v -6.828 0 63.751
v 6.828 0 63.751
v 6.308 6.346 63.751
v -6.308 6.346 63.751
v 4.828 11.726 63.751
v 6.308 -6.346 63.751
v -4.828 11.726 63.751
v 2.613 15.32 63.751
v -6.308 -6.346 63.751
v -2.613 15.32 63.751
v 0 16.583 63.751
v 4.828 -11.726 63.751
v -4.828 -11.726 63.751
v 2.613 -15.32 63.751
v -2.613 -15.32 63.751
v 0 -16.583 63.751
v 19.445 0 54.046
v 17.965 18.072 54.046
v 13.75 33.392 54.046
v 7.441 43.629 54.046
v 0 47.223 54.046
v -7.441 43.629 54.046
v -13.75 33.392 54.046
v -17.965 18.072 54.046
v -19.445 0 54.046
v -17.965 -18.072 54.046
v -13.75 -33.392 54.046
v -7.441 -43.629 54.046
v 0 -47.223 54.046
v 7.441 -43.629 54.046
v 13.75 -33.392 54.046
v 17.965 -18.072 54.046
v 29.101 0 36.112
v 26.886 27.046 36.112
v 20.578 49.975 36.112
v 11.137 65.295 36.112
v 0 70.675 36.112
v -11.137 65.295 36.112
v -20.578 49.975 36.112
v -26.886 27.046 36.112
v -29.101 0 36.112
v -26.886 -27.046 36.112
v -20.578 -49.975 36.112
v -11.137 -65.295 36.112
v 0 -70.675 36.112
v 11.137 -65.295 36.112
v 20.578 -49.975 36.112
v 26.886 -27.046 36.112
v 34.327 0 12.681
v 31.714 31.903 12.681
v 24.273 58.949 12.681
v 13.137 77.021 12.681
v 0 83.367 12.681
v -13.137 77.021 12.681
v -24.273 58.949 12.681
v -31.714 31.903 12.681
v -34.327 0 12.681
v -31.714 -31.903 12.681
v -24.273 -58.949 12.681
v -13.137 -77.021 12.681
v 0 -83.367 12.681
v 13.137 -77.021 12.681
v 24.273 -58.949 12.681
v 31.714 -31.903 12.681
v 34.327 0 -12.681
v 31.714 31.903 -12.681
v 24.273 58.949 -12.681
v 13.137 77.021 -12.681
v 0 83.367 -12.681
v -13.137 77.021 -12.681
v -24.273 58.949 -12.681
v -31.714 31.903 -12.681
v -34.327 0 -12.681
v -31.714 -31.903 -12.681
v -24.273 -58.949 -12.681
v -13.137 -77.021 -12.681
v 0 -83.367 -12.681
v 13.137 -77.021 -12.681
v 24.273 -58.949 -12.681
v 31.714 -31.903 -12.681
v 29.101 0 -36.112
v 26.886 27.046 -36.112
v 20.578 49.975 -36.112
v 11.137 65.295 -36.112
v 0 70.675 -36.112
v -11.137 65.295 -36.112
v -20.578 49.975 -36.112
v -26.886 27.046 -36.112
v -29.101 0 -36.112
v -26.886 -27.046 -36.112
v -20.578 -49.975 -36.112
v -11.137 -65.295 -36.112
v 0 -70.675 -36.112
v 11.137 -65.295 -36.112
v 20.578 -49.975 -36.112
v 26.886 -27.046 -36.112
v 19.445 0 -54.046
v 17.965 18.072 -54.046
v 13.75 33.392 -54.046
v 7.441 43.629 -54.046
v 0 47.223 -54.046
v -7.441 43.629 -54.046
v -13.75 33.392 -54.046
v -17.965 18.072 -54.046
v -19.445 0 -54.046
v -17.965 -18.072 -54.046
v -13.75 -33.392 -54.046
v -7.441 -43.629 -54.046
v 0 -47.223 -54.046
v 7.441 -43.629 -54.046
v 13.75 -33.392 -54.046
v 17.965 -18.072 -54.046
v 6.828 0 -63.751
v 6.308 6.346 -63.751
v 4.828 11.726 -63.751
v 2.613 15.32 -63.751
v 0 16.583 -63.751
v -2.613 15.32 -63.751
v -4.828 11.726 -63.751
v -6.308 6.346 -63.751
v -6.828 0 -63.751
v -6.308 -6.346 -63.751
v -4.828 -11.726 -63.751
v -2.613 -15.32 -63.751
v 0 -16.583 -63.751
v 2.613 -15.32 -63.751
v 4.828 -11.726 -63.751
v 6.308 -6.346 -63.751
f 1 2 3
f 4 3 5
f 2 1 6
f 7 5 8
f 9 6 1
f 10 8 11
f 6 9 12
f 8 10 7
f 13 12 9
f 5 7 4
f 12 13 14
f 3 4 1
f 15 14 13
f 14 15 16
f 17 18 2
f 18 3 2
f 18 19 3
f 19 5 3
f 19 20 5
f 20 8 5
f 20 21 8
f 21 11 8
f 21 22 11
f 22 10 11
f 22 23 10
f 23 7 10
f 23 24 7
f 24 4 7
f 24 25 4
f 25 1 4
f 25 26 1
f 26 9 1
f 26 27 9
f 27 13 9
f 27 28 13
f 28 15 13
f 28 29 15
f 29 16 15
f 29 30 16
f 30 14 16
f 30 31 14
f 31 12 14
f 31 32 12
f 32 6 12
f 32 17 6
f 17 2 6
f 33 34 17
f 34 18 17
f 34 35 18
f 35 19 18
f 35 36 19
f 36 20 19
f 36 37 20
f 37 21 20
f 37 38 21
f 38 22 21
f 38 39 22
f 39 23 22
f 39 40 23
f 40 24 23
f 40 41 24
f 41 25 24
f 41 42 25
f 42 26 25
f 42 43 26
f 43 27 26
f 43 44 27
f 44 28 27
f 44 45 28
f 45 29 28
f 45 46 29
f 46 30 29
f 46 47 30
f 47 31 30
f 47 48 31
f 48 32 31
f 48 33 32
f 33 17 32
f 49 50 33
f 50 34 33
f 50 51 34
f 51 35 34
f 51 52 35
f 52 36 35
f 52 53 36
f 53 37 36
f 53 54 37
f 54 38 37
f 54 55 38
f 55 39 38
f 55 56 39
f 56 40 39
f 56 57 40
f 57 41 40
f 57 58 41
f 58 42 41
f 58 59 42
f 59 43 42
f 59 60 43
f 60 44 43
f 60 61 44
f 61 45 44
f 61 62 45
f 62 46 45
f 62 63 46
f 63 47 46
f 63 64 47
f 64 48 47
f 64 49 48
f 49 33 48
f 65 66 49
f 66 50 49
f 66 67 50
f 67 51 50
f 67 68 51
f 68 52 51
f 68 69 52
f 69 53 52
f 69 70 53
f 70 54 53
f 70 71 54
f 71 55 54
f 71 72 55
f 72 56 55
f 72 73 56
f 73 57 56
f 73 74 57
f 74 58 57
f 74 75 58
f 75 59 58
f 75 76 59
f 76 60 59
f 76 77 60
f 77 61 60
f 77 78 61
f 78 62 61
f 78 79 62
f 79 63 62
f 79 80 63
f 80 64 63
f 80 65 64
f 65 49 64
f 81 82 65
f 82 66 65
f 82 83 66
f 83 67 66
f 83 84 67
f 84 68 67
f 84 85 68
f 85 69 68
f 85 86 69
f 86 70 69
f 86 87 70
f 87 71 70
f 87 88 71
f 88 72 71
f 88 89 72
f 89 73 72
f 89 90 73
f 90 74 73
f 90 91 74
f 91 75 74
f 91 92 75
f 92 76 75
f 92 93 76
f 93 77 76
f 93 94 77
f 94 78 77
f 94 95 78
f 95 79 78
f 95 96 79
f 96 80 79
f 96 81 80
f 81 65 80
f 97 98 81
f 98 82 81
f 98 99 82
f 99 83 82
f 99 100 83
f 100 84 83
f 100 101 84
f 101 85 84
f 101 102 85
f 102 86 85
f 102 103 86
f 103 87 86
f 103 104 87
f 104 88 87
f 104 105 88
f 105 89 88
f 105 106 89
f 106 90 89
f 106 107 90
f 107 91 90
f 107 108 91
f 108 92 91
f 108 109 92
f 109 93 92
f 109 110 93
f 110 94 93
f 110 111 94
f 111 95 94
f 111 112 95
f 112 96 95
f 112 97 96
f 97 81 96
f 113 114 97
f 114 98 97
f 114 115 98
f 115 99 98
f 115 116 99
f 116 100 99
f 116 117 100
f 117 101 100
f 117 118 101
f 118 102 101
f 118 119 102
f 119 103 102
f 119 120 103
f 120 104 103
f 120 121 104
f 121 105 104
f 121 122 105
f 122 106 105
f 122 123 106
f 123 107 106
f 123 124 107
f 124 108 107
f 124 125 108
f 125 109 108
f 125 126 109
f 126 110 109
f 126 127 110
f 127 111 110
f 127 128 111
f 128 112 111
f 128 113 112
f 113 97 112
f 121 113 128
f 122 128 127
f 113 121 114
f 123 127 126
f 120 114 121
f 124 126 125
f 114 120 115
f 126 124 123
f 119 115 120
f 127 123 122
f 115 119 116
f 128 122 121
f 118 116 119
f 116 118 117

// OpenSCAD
// Generated by SolidPython 1.0.1 on 2020-07-29 00:46:48


scale(v = [7, 17, 13]) {
	sphere(r = 5);
}
/***********************************************
*********      SolidPython code:      **********
************************************************
 
# import packages: SolidPython
from solid import *
from solid.utils import *
from itertools import chain, combinations, permutations


class Resize:

    def __init__(self, scad_file):
        self.scad_file = scad_file
        #self.scad_file = import_scad(scad_file)
        # cone/cylinder param:
        self.r1 = 0
        self.r2 = 0
        self.h = 0
        # rectangular prism param:
        self.w = 0
        self.l = 0
        # ellipse param:
        self.r = 0

    # import OpenScad code (file name corresponds to shape)


    # classify shape + parameters
    def assign(self, param1, param2, param3):
        if self.scad_file == 'cone.scad':
            self.r1 = param1
            self.r2 = param2
            self.h = param3
        elif self.scad_file == 'cylinder.scad':
            self.r1 = param1
            self.r2 = param2
            self.h = param3
        elif self.scad_file == 'rectangularPrism.scad':
            self.h = param1
            self.l = param2
            self.w = param3
        else:
            self.r = param1
            self.h = param2

    # resize parameters
    def iterate(self):
        x = range(3, 20, 2)
        i = 1
        if self.scad_file == 'cone.scad':
            tempList = list(permutations(x, 2))
            for temp in tempList:
                param1 = temp[0]
                param2 = temp[1]
                filepath = 'produced_scad_files/' + 'cone' + str(param1) + '_' + str(param2) + '_' + '.scad'
                scad_render_to_file(cylinder(h=param1, r1=param2, r2=0), filepath)

        elif self.scad_file == 'cylinder.scad':
            tempList = list(permutations(x, 3))
            for temp in tempList:
                param1 = temp[0]
                param2 = temp[1]
                filepath = 'produced_scad_files/' + 'cylinder' + str(param1) + '_' + str(param2) + '_' + '.scad'
                scad_render_to_file(cylinder(h=param1, r1=param2, r2=param2), filepath)

        elif self.scad_file == 'rectangularPrism.scad':
            tempList = list(permutations(x, 3))
            for temp in tempList:
                param1 = temp[0]
                param2 = temp[1]
                param3 = temp[2]
                filepath = 'produced_scad_files/' + 'rectangularPrism' + str(param1) + '_' + str(param2) + '_' + str(
                    param3) + '.scad'
                scad_render_to_file(cube(size=(param1, param2, param3)), filepath)

        elif self.scad_file == 'ellipse.scad':
            tempList = list(permutations(x, 4))
            for temp in tempList:
                param1 = temp[0]
                param2 = temp[1]
                param3 = temp[2]
                param4 = temp[3]
                filepath = 'produced_scad_files/' + 'ellipse' + str(param1) + '_' + str(param2) + '_' + str(param3) + '_' + str(param4) + '.scad'
                scad_render_to_file(scale([param1, param2, param3])(sphere(r=param4)), filepath)

    def render_to_scadfile(self):
        scad_render_to_file(scad, 'example.scad') 
 
************************************************/
